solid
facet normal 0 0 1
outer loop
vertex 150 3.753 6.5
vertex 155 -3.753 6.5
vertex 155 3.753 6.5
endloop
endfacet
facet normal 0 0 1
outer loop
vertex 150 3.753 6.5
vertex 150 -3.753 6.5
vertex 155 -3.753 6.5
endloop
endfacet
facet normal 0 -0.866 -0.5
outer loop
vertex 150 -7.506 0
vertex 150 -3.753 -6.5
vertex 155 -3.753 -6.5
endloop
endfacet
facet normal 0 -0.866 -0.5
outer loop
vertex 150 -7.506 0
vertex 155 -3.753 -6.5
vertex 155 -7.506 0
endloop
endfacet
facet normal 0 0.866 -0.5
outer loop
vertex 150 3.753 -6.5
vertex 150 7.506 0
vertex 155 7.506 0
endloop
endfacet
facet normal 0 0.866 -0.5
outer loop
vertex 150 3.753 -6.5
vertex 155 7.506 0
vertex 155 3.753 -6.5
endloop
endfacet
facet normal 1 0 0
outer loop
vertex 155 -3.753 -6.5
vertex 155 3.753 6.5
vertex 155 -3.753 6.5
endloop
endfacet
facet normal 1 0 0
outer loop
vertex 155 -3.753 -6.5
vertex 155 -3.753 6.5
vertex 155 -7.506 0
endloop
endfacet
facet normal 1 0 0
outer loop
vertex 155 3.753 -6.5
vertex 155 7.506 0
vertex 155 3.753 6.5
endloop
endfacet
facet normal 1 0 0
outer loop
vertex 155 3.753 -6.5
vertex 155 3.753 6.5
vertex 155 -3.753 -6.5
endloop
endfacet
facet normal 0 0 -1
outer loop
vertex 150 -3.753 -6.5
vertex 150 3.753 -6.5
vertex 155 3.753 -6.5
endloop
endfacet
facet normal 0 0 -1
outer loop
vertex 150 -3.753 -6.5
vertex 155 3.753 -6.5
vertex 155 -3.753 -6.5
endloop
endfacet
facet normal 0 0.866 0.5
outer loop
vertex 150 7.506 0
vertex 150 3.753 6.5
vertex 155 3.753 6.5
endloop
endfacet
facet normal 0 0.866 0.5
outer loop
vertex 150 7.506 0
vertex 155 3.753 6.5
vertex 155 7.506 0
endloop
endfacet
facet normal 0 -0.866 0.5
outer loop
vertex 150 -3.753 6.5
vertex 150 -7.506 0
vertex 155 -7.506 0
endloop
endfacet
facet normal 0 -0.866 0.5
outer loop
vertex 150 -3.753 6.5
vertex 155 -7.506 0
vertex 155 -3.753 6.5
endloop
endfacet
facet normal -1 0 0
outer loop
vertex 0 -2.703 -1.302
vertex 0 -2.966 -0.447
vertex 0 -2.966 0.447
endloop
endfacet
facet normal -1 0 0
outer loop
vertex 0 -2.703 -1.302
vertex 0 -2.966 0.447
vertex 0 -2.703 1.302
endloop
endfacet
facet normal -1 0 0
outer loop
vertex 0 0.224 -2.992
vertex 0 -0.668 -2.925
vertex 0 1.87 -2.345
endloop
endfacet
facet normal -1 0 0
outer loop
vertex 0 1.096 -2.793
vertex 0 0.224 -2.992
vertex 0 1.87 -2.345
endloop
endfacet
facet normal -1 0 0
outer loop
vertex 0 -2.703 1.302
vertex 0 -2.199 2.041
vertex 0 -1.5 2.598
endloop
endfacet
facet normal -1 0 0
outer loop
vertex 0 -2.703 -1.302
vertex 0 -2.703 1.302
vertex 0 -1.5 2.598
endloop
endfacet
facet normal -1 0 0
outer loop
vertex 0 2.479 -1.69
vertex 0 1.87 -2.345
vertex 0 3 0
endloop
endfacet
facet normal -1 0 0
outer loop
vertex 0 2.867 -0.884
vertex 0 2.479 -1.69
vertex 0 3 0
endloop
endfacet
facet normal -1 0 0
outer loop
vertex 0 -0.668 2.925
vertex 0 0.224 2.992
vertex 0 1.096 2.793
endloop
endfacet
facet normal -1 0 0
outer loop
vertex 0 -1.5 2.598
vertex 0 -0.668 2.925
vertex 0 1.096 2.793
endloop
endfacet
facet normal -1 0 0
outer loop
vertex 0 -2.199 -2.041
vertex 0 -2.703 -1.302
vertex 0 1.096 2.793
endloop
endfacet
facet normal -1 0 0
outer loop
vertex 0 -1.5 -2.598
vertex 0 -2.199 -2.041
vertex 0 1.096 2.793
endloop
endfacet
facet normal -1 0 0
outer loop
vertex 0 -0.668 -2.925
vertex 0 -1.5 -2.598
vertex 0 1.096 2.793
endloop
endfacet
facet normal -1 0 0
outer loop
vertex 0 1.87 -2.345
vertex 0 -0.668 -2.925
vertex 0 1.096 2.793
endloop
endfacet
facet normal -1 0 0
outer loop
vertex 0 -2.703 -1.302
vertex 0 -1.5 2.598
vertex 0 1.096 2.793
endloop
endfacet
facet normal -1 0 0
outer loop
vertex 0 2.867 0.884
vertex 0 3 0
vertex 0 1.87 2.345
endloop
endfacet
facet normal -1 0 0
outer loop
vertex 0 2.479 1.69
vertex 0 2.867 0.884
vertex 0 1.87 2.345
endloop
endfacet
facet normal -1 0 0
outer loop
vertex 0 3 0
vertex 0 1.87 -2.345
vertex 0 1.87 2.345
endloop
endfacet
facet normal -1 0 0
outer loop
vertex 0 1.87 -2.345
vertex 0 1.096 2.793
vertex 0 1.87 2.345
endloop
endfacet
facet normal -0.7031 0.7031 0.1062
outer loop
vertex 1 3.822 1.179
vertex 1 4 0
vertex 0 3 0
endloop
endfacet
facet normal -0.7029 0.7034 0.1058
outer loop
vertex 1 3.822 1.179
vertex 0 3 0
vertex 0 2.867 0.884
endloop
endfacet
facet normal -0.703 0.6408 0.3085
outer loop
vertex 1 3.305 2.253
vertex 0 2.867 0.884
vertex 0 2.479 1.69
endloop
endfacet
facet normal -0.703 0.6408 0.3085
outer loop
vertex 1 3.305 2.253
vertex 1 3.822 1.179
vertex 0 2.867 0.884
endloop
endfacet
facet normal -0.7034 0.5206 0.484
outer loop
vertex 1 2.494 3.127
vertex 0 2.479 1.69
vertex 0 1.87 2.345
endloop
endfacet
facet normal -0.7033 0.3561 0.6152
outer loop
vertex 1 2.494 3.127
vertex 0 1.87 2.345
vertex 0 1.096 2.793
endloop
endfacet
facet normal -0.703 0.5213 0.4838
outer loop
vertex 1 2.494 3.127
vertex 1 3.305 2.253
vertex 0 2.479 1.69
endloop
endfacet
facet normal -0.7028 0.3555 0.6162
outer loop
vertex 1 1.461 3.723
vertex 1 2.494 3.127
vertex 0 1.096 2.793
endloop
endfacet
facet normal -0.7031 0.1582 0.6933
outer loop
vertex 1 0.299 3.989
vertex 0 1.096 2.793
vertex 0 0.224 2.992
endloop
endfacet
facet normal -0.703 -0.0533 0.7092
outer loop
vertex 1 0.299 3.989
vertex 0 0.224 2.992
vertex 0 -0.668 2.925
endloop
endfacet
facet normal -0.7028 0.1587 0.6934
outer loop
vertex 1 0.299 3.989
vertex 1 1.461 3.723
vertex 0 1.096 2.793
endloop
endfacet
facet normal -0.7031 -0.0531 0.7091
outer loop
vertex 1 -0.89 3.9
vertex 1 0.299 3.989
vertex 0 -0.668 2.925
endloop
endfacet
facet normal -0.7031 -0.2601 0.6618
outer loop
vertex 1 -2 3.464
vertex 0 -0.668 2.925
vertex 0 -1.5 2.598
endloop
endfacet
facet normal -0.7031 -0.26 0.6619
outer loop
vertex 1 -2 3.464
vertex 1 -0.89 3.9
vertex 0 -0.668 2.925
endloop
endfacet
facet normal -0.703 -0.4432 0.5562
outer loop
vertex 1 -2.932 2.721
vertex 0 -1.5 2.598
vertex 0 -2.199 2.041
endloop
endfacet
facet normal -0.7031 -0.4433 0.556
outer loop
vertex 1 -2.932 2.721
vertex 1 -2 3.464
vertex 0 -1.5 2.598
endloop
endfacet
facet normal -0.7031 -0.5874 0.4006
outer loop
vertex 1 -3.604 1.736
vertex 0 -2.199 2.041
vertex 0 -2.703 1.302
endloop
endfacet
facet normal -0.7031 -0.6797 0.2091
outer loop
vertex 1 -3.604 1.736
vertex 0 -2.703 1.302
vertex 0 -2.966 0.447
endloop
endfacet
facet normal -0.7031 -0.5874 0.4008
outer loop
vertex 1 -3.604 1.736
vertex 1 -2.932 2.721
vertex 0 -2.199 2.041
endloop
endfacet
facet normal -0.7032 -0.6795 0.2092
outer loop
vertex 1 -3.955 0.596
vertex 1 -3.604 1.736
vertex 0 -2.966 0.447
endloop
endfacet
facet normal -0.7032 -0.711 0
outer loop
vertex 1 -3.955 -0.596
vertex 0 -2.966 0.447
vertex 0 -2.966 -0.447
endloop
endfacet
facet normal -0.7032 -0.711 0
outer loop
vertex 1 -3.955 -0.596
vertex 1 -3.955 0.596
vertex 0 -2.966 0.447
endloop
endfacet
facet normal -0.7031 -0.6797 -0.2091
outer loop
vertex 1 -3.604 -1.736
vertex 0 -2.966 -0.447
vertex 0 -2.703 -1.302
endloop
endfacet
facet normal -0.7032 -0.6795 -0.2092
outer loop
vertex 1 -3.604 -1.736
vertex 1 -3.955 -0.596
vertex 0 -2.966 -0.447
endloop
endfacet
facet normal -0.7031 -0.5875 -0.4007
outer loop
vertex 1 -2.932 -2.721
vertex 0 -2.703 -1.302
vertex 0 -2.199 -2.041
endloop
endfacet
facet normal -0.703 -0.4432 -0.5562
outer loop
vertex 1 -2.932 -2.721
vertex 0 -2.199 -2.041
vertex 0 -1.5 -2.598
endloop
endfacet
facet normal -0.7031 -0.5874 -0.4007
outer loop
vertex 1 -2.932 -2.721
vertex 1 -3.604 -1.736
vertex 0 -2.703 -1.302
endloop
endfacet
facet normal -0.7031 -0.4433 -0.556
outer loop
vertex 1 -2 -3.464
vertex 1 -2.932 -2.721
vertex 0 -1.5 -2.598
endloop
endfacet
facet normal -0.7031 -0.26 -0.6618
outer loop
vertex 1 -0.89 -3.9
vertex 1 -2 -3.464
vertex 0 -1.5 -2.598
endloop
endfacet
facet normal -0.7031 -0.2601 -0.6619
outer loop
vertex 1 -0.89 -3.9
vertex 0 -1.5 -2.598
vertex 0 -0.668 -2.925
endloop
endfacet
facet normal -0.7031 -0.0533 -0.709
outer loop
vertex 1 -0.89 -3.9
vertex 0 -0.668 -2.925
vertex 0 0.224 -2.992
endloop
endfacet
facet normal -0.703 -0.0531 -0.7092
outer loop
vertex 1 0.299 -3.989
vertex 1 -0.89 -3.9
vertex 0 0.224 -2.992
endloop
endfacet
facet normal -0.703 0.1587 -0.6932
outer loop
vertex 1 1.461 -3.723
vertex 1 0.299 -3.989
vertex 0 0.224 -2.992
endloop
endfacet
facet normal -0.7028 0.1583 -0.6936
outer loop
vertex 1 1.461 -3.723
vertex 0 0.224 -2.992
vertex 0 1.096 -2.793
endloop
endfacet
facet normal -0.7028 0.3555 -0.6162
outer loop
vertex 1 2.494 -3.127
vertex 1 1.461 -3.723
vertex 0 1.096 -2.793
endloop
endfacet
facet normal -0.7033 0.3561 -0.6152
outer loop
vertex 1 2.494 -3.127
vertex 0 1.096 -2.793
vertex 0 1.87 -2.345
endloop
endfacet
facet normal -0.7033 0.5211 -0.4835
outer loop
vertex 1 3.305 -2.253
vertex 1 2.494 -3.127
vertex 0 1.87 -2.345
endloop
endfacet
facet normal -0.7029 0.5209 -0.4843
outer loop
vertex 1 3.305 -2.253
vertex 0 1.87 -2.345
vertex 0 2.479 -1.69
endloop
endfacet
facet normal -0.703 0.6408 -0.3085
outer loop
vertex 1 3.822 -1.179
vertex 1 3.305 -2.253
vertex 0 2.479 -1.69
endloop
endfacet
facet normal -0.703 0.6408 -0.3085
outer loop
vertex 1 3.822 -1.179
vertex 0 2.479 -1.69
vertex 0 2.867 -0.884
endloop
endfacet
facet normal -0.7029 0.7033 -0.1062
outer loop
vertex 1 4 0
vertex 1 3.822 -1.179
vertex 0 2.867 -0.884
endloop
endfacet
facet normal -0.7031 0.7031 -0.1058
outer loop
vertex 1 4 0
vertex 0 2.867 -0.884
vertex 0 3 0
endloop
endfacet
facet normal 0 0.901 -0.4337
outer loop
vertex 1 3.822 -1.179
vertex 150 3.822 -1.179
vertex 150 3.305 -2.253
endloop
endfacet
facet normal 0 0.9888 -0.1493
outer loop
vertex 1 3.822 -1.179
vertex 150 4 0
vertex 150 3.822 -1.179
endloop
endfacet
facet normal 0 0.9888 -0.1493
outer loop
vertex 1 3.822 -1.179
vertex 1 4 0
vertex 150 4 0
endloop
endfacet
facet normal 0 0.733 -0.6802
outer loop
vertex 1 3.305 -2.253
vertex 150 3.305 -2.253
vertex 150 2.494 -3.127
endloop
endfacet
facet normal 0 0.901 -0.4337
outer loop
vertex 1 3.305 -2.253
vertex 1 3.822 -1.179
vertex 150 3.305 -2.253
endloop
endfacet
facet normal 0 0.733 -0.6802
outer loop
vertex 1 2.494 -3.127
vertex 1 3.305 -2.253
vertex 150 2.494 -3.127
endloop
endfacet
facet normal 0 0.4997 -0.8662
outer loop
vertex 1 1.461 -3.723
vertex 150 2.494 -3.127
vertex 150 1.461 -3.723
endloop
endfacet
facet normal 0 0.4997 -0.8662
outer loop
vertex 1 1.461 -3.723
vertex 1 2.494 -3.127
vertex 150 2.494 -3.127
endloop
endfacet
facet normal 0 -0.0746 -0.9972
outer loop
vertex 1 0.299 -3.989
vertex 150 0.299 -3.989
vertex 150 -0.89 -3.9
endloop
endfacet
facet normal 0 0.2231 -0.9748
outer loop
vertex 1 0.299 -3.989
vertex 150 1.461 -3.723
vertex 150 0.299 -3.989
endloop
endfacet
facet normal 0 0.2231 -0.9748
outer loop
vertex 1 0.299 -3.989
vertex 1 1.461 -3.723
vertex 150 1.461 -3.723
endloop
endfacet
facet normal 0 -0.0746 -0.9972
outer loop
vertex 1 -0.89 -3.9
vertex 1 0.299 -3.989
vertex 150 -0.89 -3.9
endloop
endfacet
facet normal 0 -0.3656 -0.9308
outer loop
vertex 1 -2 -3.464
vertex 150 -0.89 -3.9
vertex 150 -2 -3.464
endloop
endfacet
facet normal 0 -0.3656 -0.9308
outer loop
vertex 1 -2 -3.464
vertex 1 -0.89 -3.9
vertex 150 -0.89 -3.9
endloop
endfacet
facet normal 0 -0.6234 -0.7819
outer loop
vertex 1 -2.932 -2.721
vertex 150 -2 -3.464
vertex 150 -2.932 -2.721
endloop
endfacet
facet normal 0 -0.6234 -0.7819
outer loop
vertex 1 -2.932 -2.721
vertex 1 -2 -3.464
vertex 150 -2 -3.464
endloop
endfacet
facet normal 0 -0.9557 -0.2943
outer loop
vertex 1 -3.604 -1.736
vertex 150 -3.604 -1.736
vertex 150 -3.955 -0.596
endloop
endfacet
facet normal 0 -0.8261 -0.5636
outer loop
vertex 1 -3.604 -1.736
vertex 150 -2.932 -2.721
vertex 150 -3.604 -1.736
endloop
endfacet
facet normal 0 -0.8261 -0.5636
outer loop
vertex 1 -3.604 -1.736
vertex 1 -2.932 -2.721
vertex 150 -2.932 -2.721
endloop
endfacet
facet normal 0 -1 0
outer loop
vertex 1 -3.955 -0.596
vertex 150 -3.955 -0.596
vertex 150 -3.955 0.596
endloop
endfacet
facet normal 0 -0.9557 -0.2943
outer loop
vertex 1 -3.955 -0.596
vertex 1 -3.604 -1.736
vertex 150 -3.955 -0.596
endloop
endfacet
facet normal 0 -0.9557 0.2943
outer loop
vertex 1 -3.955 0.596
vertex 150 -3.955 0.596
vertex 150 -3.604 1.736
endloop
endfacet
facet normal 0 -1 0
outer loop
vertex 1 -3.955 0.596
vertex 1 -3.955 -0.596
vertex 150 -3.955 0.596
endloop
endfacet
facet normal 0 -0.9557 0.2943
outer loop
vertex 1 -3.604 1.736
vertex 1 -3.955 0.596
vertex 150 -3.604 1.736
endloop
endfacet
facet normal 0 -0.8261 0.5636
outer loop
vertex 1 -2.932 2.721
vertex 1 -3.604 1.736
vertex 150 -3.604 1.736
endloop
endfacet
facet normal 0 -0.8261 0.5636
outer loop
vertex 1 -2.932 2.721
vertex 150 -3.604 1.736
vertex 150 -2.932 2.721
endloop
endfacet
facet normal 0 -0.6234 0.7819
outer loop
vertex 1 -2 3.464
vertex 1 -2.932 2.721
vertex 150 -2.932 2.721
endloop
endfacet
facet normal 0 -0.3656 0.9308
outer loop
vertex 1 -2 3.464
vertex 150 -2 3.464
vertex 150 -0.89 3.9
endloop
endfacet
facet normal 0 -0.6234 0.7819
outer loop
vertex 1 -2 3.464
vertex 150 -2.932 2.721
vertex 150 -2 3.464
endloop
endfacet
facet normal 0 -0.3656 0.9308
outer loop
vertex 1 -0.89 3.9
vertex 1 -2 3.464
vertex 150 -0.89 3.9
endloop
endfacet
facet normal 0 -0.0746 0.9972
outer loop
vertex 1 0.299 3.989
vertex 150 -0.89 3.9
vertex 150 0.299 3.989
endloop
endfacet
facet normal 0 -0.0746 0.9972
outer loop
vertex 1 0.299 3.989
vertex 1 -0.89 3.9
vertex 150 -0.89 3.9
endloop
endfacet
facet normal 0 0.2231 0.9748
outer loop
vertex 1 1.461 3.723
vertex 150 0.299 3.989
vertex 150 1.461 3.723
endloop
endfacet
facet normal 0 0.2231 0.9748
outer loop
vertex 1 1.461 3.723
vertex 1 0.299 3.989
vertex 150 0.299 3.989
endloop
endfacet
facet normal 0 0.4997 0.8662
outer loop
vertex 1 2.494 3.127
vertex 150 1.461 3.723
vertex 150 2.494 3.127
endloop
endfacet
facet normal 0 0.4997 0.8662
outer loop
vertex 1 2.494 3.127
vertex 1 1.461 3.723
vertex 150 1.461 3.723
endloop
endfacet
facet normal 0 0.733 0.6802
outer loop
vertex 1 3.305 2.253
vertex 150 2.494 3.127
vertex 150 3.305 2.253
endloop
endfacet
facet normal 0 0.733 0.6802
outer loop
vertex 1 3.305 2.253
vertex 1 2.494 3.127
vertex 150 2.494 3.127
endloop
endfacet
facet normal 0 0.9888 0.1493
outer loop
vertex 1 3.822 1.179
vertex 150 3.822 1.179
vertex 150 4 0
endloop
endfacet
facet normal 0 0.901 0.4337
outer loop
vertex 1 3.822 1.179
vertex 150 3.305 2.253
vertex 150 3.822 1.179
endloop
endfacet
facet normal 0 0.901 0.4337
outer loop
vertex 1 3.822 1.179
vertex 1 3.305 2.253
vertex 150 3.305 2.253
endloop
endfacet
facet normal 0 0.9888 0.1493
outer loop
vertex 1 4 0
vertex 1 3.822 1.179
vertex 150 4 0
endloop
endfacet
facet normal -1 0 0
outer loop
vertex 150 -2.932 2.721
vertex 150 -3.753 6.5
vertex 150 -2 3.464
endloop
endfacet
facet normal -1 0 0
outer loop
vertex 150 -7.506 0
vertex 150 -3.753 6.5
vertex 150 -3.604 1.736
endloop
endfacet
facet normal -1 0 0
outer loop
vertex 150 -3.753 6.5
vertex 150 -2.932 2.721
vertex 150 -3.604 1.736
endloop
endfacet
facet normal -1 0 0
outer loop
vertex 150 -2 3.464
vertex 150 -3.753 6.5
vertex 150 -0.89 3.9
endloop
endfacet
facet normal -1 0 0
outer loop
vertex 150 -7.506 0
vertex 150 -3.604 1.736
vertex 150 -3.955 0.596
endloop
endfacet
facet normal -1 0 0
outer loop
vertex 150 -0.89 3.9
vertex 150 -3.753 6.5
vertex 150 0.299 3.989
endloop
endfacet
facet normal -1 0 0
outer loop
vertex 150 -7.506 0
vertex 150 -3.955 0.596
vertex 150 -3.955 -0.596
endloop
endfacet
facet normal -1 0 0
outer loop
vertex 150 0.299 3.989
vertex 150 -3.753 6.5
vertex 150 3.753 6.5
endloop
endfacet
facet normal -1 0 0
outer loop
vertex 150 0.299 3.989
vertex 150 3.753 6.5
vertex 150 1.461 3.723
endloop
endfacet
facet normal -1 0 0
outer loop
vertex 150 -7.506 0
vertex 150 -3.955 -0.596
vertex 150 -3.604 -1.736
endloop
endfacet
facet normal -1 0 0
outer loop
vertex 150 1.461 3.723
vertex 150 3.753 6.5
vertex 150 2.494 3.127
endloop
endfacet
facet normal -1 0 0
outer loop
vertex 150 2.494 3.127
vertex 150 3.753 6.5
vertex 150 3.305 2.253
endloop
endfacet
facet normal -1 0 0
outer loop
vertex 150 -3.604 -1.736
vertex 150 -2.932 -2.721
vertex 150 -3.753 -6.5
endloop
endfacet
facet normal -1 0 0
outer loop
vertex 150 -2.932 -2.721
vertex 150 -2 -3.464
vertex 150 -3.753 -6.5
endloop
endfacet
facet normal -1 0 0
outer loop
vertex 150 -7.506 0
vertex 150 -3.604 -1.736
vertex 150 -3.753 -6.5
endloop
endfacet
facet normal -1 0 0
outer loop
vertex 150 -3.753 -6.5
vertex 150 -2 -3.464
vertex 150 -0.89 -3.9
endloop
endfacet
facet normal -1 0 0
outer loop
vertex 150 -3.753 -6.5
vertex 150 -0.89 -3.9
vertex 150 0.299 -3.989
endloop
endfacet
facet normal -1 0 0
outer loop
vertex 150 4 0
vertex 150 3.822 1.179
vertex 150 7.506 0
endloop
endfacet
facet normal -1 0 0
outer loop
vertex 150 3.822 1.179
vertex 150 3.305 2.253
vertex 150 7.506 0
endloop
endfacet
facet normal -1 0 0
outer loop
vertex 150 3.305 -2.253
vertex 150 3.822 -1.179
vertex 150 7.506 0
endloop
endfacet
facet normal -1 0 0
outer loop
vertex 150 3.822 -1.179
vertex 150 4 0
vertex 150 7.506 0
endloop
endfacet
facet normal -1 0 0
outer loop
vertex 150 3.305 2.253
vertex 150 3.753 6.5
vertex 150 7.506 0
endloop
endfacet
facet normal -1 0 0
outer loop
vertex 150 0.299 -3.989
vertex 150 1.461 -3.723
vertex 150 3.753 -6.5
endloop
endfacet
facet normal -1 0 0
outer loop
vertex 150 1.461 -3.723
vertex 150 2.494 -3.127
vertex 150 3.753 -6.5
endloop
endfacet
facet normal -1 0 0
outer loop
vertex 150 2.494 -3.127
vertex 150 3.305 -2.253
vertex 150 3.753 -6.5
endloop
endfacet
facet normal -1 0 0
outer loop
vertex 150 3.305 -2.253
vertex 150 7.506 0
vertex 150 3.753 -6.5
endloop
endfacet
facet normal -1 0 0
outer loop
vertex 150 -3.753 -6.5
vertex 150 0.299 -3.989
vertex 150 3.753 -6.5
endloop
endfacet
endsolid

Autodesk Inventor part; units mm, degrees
ref_plane "YZ Plane" through (0, 0, 0) normal (1, 0, 0) x (0, 1, 0)
ref_plane "XZ Plane" through (0, 0, 0) normal (0, 1, 0) x (-1, 0, 0)
ref_plane "XY Plane" through (0, 0, 0) normal (0, 0, 1) x (1, 0, 0)
sketch "Sketch1" plane through (0, 0, 0) normal (1, 0, 0) x (0, 1, 0)
  circle A0 centre (0, 0) radius 4
  dimension "d0" = 4
extrude "Extrusion1" add sketch "Sketch1" along normal blind 150
sketch "Sketch2" plane through (150, 0, 0) normal (1, 0, 0) x (0, 0, -1)
  circle A0 centre (0, 0) radius 4 projected
  line L0 (0, 7.5056) -> (6.5, 3.7528)
  line L1 (6.5, 3.7528) -> (6.5, -3.7528)
  line L2 (6.5, -3.7528) -> (0, -7.5056)
  line L3 (0, -7.5056) -> (-6.5, -3.7528)
  line L4 (-6.5, -3.7528) -> (-6.5, 3.7528)
  line L5 (-6.5, 3.7528) -> (0, 7.5056)
  dimension "d5" = 13
  dimension "d8" = 6.5
thread "Thread2" size "M8x1.25" class "6g" standard "ANSI Metric M Profile" full length
extrude "Extrusion2" add sketch "Sketch2" along normal blind 5 contours A0 | L0 L1 L2 L3 L4 L5
chamfer "Chamfer1" distance 1 angle 45 1 edges at (0, -4, 0)
properties part number "M8x150mm"
